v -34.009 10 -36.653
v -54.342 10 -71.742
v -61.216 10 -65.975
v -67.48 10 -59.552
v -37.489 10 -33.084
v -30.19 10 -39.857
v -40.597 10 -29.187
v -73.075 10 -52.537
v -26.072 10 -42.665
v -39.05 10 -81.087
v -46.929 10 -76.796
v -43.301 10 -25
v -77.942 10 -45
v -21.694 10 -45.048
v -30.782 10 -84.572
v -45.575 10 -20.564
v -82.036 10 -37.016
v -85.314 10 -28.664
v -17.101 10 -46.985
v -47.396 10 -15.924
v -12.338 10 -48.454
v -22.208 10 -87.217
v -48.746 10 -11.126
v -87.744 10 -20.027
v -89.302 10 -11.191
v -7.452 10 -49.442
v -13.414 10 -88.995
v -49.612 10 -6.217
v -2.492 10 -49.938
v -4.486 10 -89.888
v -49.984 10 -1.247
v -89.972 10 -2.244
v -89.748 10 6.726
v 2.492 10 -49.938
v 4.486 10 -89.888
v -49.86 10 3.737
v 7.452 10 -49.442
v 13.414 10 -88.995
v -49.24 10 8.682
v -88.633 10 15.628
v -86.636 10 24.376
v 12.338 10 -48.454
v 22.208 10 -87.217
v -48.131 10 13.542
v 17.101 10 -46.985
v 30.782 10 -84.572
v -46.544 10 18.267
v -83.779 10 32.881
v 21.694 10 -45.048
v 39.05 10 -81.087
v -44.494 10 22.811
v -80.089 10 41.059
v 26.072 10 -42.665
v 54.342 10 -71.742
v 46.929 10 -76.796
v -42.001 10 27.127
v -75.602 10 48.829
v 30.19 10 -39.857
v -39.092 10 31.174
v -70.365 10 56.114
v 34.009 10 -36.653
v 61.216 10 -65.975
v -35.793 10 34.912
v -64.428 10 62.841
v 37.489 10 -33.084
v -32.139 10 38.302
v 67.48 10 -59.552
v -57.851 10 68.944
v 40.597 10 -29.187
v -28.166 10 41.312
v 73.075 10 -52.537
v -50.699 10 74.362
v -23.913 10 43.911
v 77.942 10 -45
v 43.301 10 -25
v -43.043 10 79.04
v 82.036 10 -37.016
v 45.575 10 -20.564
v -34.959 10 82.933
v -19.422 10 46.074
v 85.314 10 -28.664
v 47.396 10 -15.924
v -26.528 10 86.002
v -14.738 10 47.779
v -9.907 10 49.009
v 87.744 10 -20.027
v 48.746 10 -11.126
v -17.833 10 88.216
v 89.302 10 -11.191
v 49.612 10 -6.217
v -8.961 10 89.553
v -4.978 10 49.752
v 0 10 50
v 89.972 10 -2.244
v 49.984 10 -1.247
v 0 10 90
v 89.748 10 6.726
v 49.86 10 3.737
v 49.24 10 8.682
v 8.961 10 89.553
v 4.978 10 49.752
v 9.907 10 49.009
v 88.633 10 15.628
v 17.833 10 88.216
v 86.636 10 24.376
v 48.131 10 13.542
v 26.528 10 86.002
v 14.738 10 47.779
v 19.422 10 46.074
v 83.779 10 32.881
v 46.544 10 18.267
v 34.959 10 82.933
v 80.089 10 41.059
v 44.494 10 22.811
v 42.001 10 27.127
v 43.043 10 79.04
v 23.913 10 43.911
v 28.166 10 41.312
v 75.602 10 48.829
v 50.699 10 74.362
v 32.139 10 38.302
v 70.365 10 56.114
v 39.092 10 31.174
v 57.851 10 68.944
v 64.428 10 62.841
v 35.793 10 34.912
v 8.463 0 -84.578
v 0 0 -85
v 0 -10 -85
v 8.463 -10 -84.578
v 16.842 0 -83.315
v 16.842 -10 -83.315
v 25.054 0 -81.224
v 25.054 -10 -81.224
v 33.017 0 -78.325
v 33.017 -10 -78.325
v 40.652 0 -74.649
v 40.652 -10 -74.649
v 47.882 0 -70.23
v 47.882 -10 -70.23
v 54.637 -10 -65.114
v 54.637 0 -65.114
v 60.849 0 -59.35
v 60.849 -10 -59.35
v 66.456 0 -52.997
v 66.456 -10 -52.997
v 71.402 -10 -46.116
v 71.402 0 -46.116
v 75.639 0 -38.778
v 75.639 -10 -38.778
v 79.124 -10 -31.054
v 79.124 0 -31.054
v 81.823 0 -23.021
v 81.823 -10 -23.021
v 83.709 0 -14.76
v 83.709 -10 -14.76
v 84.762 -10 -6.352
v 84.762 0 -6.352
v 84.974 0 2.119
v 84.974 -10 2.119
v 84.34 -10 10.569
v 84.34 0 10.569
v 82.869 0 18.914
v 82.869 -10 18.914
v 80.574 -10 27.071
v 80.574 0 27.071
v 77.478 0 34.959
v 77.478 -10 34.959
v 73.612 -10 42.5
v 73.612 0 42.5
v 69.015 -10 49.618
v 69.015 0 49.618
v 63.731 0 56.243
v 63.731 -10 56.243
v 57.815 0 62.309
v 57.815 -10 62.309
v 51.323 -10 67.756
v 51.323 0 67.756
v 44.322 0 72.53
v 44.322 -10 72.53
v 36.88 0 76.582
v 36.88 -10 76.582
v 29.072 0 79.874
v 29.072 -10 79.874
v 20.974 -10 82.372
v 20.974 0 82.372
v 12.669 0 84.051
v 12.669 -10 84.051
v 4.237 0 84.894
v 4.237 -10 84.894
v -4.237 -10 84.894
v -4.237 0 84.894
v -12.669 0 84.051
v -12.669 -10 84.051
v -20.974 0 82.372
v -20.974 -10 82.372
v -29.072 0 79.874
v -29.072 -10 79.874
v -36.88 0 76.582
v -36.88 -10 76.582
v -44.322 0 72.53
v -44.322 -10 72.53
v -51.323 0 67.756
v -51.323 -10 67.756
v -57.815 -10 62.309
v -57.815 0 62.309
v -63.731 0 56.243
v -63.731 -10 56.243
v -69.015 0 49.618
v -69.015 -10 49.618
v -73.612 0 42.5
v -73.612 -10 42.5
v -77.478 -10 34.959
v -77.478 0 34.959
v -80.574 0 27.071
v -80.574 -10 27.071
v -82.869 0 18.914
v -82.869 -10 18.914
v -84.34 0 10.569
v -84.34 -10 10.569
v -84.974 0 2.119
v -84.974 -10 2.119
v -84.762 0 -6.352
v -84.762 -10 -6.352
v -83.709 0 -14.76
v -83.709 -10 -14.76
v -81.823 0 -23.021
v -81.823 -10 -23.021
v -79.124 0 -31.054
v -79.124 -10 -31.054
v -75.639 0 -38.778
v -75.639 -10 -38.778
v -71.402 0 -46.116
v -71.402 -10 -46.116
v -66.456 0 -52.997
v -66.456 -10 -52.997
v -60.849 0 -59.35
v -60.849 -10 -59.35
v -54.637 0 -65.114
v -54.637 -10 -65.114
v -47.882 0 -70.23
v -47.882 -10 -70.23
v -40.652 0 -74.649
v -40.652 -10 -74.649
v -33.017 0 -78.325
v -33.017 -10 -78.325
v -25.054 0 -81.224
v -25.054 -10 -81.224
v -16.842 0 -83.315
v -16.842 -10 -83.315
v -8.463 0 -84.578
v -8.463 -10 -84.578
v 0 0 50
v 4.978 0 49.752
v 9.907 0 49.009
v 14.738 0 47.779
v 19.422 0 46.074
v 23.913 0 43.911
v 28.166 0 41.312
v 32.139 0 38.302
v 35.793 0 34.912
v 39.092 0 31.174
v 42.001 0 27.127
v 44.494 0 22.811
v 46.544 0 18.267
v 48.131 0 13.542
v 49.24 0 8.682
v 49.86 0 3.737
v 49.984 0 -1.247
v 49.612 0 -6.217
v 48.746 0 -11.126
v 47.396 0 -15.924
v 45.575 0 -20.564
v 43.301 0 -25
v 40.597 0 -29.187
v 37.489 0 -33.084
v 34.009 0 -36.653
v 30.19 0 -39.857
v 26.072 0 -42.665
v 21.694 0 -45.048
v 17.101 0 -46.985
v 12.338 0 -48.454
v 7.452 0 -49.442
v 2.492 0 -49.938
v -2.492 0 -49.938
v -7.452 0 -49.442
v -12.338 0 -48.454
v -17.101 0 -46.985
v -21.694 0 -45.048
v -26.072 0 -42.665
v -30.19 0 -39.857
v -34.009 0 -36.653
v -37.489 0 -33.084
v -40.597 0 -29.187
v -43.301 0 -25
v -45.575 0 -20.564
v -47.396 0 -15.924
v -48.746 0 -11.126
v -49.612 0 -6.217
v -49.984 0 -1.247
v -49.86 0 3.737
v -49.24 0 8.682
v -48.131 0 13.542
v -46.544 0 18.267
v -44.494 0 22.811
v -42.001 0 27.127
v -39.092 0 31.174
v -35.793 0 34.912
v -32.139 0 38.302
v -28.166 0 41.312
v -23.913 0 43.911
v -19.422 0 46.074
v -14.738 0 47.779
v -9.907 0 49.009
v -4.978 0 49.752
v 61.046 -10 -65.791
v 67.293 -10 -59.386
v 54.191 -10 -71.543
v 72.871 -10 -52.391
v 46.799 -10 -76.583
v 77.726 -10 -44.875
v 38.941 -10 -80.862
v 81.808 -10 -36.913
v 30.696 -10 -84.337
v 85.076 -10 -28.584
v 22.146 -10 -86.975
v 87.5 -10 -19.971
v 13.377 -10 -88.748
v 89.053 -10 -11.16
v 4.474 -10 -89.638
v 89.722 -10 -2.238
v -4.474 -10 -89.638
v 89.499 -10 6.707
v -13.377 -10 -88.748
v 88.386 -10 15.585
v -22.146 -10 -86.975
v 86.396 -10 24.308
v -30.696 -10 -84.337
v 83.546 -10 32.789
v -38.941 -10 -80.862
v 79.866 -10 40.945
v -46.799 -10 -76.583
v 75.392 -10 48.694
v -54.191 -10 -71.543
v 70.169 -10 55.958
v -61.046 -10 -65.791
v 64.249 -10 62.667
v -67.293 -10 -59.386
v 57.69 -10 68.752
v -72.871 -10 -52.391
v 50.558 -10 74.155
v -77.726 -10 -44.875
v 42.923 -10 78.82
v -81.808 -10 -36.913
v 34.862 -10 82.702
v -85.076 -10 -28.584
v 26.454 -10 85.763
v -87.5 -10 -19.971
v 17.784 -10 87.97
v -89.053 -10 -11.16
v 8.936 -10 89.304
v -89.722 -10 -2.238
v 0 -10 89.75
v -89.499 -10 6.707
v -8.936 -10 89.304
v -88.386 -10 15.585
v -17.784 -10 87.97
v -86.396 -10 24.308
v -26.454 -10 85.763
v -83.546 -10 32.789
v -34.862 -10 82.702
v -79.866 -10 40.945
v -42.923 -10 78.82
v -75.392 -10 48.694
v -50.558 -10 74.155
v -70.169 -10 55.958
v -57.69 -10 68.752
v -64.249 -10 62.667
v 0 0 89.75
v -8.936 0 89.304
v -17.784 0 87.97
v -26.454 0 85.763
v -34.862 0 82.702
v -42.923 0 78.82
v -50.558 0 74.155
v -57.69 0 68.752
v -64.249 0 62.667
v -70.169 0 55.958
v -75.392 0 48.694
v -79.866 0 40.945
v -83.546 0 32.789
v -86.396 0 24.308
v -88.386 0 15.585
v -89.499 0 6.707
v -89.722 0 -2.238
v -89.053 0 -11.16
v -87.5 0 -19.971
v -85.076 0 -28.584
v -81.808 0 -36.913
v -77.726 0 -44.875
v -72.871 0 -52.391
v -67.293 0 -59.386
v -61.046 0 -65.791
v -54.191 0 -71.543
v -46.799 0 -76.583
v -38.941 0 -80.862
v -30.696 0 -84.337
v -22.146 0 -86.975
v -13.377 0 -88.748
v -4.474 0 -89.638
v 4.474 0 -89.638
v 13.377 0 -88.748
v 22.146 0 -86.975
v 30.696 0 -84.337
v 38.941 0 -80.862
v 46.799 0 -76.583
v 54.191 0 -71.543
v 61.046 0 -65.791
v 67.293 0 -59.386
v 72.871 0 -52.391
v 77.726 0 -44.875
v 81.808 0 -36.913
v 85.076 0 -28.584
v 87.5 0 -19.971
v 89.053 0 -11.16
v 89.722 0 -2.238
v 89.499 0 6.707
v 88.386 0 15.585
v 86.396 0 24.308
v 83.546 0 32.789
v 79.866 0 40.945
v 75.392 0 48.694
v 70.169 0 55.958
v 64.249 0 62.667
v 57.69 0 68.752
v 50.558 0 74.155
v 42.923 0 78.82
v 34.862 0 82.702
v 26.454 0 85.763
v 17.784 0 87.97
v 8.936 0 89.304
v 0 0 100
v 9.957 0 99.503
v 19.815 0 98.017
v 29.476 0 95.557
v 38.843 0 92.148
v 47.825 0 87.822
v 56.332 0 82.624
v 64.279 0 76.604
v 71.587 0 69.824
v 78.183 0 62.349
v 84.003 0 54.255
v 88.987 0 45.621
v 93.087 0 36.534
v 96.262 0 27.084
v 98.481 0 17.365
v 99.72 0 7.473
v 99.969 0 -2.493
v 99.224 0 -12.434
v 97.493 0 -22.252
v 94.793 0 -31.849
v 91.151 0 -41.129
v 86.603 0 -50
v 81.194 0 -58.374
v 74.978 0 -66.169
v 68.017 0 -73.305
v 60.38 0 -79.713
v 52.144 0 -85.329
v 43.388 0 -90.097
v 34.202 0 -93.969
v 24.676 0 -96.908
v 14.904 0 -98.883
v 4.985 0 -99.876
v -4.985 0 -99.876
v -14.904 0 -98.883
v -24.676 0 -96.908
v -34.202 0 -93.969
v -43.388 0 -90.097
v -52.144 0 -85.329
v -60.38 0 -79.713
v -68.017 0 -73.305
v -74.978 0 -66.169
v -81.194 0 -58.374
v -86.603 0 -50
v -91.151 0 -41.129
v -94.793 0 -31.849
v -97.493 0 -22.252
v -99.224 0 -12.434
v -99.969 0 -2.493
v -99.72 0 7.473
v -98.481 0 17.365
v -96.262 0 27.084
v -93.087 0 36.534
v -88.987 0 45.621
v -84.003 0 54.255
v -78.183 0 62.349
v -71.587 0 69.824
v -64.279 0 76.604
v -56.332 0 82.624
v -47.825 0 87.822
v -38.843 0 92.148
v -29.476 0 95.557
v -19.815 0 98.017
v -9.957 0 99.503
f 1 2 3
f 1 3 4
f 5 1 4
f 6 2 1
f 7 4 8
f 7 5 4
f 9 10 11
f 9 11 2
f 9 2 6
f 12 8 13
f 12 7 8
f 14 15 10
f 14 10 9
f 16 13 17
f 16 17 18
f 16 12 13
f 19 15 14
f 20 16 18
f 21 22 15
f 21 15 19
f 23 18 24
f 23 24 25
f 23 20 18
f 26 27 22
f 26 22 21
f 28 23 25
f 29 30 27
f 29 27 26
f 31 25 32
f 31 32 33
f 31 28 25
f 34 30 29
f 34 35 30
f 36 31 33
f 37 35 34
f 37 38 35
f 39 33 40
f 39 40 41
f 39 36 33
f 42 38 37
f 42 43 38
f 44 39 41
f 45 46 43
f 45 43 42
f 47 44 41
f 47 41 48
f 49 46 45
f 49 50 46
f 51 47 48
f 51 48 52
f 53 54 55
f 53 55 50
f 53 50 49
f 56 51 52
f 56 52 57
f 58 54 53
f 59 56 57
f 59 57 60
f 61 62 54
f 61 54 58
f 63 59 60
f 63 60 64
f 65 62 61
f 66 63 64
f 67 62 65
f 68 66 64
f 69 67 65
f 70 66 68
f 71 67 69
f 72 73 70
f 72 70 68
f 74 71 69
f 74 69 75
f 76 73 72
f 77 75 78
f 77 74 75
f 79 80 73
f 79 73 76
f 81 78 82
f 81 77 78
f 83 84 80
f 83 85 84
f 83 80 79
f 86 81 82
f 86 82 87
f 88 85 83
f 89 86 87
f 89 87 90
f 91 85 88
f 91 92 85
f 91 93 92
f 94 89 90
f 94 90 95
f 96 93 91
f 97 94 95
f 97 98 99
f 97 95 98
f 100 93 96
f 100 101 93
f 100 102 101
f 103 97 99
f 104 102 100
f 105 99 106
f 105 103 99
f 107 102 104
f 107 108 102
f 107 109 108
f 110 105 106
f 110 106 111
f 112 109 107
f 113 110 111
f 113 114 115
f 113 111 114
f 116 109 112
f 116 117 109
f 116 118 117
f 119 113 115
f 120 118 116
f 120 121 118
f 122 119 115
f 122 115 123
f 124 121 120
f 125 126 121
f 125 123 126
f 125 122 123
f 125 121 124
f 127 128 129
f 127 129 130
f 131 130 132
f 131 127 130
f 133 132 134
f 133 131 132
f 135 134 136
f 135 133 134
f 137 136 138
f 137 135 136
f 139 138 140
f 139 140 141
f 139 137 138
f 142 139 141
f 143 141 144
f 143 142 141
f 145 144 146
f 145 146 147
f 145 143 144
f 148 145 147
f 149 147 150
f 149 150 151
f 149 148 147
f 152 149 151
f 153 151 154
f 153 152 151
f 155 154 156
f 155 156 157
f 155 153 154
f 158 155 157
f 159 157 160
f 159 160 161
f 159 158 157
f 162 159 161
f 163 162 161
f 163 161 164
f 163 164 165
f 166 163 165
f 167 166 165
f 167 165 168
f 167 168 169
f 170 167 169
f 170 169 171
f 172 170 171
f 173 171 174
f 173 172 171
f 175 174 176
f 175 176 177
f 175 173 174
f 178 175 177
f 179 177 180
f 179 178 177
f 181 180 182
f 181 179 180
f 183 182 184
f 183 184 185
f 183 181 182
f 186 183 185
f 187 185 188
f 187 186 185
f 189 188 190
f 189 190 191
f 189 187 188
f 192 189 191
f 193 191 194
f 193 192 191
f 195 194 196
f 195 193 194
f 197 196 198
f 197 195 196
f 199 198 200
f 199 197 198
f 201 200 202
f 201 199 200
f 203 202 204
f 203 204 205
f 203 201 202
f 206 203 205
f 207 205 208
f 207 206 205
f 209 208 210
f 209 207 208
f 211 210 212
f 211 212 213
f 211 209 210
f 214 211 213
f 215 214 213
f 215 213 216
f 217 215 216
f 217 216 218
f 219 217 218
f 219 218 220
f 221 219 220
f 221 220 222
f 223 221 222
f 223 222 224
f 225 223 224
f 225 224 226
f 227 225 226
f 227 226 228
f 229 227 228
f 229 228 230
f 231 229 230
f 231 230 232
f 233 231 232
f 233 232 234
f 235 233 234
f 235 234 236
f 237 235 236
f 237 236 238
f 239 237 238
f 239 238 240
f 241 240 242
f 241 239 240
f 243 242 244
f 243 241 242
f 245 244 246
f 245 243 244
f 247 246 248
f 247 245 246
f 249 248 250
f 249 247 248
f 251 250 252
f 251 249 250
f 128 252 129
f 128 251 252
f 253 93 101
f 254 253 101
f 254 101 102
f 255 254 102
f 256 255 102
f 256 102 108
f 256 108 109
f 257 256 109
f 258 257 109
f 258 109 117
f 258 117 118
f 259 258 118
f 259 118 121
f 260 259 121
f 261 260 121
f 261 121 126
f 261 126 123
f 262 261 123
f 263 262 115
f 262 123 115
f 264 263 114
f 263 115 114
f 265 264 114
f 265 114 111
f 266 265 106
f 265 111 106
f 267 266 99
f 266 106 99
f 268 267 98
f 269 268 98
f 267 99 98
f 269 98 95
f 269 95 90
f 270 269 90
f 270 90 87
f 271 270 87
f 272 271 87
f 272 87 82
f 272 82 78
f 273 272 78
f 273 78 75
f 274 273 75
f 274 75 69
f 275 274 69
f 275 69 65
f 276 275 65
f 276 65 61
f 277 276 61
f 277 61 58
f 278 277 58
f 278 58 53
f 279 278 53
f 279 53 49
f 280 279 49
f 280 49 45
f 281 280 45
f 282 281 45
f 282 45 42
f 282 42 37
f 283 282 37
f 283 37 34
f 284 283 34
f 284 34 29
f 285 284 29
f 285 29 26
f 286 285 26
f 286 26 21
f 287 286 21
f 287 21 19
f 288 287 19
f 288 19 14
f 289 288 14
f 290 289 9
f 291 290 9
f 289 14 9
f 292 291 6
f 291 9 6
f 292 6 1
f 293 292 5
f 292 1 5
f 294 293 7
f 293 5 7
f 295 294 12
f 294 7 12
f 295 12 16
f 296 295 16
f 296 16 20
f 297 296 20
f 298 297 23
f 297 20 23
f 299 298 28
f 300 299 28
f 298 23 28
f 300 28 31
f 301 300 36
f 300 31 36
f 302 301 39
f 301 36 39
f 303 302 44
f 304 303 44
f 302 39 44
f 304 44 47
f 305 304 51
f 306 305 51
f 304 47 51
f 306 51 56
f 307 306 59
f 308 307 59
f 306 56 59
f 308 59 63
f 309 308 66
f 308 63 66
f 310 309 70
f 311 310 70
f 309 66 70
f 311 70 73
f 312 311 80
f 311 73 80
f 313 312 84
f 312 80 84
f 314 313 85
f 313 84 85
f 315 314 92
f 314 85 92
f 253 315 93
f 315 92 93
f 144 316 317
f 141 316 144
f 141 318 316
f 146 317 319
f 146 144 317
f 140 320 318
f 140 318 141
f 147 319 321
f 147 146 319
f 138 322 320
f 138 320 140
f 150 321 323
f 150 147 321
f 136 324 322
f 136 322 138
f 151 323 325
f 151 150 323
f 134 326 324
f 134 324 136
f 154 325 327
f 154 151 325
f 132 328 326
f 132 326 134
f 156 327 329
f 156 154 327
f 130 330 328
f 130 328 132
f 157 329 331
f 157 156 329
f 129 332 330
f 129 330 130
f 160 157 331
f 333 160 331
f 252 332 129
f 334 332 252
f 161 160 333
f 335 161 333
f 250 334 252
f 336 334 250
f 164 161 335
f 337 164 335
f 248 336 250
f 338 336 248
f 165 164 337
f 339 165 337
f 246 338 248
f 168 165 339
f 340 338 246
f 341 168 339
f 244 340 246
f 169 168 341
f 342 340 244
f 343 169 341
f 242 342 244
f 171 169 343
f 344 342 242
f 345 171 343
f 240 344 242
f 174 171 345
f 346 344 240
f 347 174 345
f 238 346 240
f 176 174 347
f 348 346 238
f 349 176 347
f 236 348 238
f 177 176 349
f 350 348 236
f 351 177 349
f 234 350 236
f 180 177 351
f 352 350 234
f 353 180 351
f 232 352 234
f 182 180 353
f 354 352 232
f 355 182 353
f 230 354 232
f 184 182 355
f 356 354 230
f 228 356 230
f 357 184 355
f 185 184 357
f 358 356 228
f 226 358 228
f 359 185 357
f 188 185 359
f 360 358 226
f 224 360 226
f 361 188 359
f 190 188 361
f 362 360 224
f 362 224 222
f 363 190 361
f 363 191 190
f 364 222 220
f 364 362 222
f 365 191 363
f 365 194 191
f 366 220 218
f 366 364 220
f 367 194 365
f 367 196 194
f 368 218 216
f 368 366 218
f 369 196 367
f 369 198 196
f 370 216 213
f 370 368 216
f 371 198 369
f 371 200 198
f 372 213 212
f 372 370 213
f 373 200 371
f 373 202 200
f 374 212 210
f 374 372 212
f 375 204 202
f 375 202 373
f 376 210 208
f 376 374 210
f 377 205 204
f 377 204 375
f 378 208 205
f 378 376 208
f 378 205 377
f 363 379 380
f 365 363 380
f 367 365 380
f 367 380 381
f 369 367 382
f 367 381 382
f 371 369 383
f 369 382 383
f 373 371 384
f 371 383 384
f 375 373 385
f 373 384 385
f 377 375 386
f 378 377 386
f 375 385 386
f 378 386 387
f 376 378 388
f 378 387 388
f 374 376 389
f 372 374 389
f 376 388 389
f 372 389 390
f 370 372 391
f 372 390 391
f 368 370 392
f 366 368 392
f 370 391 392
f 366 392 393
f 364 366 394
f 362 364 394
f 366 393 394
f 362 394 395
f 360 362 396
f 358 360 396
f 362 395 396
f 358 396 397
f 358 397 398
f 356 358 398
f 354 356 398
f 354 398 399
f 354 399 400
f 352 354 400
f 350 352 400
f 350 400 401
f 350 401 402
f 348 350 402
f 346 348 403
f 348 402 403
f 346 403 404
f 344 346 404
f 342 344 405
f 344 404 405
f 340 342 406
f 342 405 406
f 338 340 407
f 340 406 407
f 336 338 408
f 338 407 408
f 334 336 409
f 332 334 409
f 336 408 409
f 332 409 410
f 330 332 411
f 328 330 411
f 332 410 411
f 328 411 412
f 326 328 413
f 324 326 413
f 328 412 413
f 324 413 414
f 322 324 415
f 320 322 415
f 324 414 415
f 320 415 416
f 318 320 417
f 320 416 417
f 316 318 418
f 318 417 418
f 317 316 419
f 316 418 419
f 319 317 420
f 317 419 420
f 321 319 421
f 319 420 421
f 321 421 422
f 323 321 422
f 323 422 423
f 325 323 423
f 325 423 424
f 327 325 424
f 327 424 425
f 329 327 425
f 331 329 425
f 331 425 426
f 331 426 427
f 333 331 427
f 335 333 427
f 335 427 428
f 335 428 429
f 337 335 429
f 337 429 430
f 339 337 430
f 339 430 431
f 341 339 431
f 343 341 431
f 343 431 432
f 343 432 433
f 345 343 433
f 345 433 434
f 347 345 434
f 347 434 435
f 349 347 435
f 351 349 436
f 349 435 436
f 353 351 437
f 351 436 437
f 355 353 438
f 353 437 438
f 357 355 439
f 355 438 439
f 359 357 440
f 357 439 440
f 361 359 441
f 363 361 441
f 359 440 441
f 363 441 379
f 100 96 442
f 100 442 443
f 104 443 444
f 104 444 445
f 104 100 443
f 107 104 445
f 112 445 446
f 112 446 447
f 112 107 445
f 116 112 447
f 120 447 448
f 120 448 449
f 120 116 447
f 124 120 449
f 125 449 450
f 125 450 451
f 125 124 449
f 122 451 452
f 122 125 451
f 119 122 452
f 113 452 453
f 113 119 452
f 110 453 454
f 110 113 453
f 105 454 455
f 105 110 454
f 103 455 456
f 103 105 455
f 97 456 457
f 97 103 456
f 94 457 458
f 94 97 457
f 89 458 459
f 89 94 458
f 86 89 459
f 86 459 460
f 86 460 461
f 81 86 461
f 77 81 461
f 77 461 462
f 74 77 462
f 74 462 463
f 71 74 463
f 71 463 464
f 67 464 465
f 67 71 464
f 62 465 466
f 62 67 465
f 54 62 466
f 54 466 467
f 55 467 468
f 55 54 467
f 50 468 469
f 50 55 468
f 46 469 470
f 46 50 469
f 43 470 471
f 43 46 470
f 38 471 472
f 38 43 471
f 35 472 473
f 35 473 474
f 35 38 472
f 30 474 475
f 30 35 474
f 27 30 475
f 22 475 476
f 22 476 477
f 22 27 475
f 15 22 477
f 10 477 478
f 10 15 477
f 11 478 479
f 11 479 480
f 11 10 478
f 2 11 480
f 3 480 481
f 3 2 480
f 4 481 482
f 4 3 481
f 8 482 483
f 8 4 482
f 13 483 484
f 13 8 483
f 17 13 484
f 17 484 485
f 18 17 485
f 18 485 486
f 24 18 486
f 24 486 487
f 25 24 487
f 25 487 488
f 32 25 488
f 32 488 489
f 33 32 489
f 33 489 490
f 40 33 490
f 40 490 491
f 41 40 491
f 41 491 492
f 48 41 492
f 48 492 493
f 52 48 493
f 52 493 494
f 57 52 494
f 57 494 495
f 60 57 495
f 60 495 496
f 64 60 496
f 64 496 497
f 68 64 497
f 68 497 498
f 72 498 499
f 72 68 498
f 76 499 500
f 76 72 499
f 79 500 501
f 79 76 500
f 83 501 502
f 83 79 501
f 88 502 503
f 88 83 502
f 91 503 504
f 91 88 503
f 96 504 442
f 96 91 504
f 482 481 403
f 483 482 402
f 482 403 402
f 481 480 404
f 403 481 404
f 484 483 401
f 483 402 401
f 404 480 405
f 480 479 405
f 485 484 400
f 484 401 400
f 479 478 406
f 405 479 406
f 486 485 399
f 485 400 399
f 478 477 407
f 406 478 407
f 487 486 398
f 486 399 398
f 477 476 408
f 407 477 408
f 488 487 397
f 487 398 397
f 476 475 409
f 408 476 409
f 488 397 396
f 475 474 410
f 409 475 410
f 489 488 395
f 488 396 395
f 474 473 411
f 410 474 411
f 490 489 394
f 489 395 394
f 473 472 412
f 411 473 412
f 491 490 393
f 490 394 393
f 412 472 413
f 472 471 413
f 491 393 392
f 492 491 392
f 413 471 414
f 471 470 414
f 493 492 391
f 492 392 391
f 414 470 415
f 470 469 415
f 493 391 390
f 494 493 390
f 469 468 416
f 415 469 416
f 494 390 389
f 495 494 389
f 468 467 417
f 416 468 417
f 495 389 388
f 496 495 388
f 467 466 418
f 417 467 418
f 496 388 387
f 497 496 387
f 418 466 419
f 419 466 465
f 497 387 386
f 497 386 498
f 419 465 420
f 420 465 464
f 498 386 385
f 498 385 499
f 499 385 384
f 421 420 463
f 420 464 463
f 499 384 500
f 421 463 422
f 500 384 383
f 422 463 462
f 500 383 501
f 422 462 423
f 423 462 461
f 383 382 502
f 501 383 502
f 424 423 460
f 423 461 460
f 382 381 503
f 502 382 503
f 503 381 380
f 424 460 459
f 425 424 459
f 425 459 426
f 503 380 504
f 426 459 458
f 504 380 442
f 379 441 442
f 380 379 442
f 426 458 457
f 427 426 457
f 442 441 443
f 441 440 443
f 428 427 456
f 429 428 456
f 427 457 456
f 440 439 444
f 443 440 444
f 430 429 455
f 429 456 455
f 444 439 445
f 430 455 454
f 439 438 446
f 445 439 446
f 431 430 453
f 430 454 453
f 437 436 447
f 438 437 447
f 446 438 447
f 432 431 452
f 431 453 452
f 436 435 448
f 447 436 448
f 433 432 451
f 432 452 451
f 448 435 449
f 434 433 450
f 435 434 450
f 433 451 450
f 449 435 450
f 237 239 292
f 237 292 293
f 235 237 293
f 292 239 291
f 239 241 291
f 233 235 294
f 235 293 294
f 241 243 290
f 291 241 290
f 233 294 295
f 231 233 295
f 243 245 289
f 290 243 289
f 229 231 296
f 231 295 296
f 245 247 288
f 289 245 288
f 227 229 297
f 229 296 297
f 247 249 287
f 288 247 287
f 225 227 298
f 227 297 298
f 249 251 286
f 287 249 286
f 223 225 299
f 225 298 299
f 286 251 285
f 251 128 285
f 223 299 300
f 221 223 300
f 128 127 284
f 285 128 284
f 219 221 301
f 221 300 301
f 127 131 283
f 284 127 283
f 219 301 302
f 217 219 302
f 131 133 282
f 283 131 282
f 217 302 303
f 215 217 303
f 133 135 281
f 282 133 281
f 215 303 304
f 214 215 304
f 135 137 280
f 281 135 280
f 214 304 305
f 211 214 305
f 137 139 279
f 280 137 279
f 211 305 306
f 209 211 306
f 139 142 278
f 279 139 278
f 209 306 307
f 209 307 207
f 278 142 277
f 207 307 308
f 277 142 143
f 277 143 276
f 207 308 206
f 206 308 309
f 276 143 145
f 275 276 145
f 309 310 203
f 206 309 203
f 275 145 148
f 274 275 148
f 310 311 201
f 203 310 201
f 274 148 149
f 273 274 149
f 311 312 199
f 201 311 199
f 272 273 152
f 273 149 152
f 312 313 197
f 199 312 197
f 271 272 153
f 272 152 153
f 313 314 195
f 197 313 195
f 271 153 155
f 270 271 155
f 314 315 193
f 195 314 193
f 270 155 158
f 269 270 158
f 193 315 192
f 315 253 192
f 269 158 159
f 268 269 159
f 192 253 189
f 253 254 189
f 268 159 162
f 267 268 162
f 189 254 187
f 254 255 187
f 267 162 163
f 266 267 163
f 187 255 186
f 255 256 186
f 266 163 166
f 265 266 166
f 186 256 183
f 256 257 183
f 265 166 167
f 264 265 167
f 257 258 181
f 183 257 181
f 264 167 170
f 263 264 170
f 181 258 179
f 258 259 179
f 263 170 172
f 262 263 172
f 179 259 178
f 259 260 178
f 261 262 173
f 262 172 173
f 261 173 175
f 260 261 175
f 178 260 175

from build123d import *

# Parameters (mm, degrees)
SKETCH1_R           = 100
BOSS_EXTRUDE1_DEPTH = 10
CHAMFER1_SIZE       = 10
SKETCH2_R           = 89.75
SKETCH2_R_2         = 85
BOSS_EXTRUDE2_DEPTH = 10
SKETCH3_R           = 50
CUT_EXTRUDE1_DEPTH  = 20


with BuildPart() as part:
    # Sketch1 → Boss-Extrude1 (new body)
    with BuildSketch(Plane(origin=(0, 0, 0), x_dir=(1, 0, 0), z_dir=(0, 1, 0))):
        with Locations(Location((0, 0, 0), (0, 0, 270))):
            Circle(SKETCH1_R)
    extrude(amount=BOSS_EXTRUDE1_DEPTH)

    # Chamfer1
    chamfer1_edges = [part.edges().sort_by_distance(p)[0] for p in [
        (0, 10, -100),
    ]]
    chamfer(chamfer1_edges, length=CHAMFER1_SIZE - 0.0001)  # a hair under: the kernel refuses the full size

    # Sketch2 → Boss-Extrude2 (add)
    with BuildSketch(Plane.XZ):
        with Locations(Location((0, 0, 0), (0, 0, 90))):
            Circle(SKETCH2_R)
        with Locations(Location((0, 0, 0), (0, 0, 270))):
            Circle(SKETCH2_R_2, mode=Mode.SUBTRACT)
    extrude(amount=BOSS_EXTRUDE2_DEPTH)

    # Sketch3 → Cut-Extrude1 (cut)
    with BuildSketch(Plane(origin=(0, 10, 0), x_dir=(1, 0, 0), z_dir=(0, 1, 0))):
        with Locations(Location((0, 0, 0), (0, 0, 270))):
            Circle(SKETCH3_R)
    extrude(amount=-CUT_EXTRUDE1_DEPTH, mode=Mode.SUBTRACT)


solid = part.part
